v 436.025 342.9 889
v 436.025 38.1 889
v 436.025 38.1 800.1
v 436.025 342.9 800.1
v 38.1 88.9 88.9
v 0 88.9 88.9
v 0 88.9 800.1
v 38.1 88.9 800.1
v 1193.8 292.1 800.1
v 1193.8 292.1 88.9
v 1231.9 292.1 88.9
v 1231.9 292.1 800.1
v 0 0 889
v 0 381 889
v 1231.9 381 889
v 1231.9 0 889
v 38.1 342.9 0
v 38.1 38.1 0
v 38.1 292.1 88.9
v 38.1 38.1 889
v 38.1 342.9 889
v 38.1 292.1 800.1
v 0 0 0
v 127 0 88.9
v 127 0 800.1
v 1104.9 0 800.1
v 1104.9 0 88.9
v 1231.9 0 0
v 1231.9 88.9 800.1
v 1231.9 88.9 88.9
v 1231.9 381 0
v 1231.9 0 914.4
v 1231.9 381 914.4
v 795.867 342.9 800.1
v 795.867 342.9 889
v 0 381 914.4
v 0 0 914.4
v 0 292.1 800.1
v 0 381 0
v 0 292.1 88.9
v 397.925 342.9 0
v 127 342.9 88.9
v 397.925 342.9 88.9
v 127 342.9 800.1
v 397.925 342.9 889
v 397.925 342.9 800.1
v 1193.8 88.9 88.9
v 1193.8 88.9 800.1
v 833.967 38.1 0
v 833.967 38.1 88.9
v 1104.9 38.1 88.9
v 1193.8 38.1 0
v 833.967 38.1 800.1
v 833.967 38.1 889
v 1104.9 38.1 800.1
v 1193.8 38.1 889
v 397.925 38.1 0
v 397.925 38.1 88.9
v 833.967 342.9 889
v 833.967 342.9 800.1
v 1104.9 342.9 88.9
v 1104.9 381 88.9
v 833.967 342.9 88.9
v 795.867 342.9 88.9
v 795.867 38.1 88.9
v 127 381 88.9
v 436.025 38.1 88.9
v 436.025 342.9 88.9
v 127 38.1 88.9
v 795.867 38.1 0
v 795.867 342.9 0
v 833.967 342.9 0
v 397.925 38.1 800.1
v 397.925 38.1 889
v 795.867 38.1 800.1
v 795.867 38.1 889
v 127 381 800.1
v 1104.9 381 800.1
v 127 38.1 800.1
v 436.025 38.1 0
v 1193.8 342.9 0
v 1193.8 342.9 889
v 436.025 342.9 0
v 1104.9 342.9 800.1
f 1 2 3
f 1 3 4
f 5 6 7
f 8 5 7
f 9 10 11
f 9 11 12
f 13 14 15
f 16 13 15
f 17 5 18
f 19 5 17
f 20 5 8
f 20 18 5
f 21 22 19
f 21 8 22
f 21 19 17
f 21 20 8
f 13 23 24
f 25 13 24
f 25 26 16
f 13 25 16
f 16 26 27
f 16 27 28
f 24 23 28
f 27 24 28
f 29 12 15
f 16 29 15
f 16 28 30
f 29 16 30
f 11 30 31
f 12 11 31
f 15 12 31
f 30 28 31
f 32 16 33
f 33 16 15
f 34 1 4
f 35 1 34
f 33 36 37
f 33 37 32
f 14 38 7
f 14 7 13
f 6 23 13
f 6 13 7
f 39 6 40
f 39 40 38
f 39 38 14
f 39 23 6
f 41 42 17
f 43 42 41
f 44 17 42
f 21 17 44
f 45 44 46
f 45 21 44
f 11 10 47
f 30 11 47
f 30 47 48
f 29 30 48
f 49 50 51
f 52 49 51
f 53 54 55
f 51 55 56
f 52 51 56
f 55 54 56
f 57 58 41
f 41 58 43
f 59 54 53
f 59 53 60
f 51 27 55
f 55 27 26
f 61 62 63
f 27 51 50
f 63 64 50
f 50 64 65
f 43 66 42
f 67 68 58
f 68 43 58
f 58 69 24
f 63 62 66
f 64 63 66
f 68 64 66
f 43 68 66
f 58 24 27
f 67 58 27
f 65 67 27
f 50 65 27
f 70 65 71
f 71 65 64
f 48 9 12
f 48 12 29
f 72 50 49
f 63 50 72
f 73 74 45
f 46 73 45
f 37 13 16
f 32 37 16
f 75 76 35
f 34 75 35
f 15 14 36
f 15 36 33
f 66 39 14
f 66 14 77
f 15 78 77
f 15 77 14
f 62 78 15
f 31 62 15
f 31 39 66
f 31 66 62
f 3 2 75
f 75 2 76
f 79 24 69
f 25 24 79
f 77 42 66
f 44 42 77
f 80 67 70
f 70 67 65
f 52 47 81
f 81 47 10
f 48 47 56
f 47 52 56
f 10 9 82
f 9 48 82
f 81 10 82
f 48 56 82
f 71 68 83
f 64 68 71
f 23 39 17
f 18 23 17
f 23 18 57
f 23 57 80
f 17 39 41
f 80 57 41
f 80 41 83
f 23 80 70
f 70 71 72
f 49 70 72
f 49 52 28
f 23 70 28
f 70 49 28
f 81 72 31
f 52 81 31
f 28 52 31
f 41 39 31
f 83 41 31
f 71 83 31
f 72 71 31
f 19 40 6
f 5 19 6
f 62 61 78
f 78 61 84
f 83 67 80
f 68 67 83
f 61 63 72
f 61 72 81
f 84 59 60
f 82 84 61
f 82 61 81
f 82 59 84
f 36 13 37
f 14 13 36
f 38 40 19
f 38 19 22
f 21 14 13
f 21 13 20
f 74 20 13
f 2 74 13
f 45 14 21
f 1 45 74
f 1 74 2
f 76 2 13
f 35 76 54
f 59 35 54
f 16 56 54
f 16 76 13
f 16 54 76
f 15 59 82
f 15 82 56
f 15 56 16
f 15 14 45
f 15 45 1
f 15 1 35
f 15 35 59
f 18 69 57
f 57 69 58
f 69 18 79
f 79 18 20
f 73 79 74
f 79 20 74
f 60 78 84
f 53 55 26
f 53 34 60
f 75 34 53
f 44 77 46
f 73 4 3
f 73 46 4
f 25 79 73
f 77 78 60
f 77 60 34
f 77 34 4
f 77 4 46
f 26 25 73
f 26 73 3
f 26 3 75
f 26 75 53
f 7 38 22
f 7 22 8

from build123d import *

# Parameters (mm, degrees)
F0_W     = 1231.9
F0_H     = 381
F6_DEPTH = 889
F1_W     = 203.2
F1_H     = 711.2
F2_DEPTH = 1231.901
F3_W     = 977.9
F3_H     = 711.2
F7_DEPTH = 381.001
F8_W     = 359.824867
F8_H     = 304.8
F8_W_2   = 359.8418
F8_W_3   = 359.833333
F9_DEPTH = 889.001
F4_W     = 1231.9
F4_H     = 381
F5_DEPTH = 25.4


with BuildPart() as f6:
    # F0 (on Top) → F6 (new body)
    with BuildSketch(Plane.XY):
        with Locations((615.95, 190.5)):
            Rectangle(F0_W, F0_H)
    extrude(amount=F6_DEPTH)

    # F1 (on face) → F2 (cut, through all)
    with BuildSketch(Plane(origin=(0, 0, 0), x_dir=(0, -1, 0), z_dir=(-1, 0, 0))):
        with Locations((-190.5, 444.5)):
            Rectangle(F1_W, F1_H)
    extrude(amount=-F2_DEPTH, mode=Mode.SUBTRACT)

    # F3 (on face) → F7 (cut, through all)
    with BuildSketch(Plane.XZ):
        with Locations((615.95, 444.5)):
            Rectangle(F3_W, F3_H)
    extrude(amount=-F7_DEPTH, mode=Mode.SUBTRACT)

    # F8 (on face) → F9 (cut, through all)
    with BuildSketch(Plane.XY.offset(889)):
        with Locations((218.012434, 190.5)):
            Rectangle(F8_W, F8_H)
        with Locations((615.945767, 190.5)):
            Rectangle(F8_W_2, F8_H)
        with Locations((1013.883333, 190.5)):
            Rectangle(F8_W_3, F8_H)
    extrude(amount=-F9_DEPTH, mode=Mode.SUBTRACT)


with BuildPart() as f5:
    # F4 (on face) → F5 (new body)
    with BuildSketch(Plane.XY.offset(889)):
        with Locations((615.95, 190.5)):
            Rectangle(F4_W, F4_H)
    extrude(amount=F5_DEPTH)


solid = Compound([f6.part, f5.part])
